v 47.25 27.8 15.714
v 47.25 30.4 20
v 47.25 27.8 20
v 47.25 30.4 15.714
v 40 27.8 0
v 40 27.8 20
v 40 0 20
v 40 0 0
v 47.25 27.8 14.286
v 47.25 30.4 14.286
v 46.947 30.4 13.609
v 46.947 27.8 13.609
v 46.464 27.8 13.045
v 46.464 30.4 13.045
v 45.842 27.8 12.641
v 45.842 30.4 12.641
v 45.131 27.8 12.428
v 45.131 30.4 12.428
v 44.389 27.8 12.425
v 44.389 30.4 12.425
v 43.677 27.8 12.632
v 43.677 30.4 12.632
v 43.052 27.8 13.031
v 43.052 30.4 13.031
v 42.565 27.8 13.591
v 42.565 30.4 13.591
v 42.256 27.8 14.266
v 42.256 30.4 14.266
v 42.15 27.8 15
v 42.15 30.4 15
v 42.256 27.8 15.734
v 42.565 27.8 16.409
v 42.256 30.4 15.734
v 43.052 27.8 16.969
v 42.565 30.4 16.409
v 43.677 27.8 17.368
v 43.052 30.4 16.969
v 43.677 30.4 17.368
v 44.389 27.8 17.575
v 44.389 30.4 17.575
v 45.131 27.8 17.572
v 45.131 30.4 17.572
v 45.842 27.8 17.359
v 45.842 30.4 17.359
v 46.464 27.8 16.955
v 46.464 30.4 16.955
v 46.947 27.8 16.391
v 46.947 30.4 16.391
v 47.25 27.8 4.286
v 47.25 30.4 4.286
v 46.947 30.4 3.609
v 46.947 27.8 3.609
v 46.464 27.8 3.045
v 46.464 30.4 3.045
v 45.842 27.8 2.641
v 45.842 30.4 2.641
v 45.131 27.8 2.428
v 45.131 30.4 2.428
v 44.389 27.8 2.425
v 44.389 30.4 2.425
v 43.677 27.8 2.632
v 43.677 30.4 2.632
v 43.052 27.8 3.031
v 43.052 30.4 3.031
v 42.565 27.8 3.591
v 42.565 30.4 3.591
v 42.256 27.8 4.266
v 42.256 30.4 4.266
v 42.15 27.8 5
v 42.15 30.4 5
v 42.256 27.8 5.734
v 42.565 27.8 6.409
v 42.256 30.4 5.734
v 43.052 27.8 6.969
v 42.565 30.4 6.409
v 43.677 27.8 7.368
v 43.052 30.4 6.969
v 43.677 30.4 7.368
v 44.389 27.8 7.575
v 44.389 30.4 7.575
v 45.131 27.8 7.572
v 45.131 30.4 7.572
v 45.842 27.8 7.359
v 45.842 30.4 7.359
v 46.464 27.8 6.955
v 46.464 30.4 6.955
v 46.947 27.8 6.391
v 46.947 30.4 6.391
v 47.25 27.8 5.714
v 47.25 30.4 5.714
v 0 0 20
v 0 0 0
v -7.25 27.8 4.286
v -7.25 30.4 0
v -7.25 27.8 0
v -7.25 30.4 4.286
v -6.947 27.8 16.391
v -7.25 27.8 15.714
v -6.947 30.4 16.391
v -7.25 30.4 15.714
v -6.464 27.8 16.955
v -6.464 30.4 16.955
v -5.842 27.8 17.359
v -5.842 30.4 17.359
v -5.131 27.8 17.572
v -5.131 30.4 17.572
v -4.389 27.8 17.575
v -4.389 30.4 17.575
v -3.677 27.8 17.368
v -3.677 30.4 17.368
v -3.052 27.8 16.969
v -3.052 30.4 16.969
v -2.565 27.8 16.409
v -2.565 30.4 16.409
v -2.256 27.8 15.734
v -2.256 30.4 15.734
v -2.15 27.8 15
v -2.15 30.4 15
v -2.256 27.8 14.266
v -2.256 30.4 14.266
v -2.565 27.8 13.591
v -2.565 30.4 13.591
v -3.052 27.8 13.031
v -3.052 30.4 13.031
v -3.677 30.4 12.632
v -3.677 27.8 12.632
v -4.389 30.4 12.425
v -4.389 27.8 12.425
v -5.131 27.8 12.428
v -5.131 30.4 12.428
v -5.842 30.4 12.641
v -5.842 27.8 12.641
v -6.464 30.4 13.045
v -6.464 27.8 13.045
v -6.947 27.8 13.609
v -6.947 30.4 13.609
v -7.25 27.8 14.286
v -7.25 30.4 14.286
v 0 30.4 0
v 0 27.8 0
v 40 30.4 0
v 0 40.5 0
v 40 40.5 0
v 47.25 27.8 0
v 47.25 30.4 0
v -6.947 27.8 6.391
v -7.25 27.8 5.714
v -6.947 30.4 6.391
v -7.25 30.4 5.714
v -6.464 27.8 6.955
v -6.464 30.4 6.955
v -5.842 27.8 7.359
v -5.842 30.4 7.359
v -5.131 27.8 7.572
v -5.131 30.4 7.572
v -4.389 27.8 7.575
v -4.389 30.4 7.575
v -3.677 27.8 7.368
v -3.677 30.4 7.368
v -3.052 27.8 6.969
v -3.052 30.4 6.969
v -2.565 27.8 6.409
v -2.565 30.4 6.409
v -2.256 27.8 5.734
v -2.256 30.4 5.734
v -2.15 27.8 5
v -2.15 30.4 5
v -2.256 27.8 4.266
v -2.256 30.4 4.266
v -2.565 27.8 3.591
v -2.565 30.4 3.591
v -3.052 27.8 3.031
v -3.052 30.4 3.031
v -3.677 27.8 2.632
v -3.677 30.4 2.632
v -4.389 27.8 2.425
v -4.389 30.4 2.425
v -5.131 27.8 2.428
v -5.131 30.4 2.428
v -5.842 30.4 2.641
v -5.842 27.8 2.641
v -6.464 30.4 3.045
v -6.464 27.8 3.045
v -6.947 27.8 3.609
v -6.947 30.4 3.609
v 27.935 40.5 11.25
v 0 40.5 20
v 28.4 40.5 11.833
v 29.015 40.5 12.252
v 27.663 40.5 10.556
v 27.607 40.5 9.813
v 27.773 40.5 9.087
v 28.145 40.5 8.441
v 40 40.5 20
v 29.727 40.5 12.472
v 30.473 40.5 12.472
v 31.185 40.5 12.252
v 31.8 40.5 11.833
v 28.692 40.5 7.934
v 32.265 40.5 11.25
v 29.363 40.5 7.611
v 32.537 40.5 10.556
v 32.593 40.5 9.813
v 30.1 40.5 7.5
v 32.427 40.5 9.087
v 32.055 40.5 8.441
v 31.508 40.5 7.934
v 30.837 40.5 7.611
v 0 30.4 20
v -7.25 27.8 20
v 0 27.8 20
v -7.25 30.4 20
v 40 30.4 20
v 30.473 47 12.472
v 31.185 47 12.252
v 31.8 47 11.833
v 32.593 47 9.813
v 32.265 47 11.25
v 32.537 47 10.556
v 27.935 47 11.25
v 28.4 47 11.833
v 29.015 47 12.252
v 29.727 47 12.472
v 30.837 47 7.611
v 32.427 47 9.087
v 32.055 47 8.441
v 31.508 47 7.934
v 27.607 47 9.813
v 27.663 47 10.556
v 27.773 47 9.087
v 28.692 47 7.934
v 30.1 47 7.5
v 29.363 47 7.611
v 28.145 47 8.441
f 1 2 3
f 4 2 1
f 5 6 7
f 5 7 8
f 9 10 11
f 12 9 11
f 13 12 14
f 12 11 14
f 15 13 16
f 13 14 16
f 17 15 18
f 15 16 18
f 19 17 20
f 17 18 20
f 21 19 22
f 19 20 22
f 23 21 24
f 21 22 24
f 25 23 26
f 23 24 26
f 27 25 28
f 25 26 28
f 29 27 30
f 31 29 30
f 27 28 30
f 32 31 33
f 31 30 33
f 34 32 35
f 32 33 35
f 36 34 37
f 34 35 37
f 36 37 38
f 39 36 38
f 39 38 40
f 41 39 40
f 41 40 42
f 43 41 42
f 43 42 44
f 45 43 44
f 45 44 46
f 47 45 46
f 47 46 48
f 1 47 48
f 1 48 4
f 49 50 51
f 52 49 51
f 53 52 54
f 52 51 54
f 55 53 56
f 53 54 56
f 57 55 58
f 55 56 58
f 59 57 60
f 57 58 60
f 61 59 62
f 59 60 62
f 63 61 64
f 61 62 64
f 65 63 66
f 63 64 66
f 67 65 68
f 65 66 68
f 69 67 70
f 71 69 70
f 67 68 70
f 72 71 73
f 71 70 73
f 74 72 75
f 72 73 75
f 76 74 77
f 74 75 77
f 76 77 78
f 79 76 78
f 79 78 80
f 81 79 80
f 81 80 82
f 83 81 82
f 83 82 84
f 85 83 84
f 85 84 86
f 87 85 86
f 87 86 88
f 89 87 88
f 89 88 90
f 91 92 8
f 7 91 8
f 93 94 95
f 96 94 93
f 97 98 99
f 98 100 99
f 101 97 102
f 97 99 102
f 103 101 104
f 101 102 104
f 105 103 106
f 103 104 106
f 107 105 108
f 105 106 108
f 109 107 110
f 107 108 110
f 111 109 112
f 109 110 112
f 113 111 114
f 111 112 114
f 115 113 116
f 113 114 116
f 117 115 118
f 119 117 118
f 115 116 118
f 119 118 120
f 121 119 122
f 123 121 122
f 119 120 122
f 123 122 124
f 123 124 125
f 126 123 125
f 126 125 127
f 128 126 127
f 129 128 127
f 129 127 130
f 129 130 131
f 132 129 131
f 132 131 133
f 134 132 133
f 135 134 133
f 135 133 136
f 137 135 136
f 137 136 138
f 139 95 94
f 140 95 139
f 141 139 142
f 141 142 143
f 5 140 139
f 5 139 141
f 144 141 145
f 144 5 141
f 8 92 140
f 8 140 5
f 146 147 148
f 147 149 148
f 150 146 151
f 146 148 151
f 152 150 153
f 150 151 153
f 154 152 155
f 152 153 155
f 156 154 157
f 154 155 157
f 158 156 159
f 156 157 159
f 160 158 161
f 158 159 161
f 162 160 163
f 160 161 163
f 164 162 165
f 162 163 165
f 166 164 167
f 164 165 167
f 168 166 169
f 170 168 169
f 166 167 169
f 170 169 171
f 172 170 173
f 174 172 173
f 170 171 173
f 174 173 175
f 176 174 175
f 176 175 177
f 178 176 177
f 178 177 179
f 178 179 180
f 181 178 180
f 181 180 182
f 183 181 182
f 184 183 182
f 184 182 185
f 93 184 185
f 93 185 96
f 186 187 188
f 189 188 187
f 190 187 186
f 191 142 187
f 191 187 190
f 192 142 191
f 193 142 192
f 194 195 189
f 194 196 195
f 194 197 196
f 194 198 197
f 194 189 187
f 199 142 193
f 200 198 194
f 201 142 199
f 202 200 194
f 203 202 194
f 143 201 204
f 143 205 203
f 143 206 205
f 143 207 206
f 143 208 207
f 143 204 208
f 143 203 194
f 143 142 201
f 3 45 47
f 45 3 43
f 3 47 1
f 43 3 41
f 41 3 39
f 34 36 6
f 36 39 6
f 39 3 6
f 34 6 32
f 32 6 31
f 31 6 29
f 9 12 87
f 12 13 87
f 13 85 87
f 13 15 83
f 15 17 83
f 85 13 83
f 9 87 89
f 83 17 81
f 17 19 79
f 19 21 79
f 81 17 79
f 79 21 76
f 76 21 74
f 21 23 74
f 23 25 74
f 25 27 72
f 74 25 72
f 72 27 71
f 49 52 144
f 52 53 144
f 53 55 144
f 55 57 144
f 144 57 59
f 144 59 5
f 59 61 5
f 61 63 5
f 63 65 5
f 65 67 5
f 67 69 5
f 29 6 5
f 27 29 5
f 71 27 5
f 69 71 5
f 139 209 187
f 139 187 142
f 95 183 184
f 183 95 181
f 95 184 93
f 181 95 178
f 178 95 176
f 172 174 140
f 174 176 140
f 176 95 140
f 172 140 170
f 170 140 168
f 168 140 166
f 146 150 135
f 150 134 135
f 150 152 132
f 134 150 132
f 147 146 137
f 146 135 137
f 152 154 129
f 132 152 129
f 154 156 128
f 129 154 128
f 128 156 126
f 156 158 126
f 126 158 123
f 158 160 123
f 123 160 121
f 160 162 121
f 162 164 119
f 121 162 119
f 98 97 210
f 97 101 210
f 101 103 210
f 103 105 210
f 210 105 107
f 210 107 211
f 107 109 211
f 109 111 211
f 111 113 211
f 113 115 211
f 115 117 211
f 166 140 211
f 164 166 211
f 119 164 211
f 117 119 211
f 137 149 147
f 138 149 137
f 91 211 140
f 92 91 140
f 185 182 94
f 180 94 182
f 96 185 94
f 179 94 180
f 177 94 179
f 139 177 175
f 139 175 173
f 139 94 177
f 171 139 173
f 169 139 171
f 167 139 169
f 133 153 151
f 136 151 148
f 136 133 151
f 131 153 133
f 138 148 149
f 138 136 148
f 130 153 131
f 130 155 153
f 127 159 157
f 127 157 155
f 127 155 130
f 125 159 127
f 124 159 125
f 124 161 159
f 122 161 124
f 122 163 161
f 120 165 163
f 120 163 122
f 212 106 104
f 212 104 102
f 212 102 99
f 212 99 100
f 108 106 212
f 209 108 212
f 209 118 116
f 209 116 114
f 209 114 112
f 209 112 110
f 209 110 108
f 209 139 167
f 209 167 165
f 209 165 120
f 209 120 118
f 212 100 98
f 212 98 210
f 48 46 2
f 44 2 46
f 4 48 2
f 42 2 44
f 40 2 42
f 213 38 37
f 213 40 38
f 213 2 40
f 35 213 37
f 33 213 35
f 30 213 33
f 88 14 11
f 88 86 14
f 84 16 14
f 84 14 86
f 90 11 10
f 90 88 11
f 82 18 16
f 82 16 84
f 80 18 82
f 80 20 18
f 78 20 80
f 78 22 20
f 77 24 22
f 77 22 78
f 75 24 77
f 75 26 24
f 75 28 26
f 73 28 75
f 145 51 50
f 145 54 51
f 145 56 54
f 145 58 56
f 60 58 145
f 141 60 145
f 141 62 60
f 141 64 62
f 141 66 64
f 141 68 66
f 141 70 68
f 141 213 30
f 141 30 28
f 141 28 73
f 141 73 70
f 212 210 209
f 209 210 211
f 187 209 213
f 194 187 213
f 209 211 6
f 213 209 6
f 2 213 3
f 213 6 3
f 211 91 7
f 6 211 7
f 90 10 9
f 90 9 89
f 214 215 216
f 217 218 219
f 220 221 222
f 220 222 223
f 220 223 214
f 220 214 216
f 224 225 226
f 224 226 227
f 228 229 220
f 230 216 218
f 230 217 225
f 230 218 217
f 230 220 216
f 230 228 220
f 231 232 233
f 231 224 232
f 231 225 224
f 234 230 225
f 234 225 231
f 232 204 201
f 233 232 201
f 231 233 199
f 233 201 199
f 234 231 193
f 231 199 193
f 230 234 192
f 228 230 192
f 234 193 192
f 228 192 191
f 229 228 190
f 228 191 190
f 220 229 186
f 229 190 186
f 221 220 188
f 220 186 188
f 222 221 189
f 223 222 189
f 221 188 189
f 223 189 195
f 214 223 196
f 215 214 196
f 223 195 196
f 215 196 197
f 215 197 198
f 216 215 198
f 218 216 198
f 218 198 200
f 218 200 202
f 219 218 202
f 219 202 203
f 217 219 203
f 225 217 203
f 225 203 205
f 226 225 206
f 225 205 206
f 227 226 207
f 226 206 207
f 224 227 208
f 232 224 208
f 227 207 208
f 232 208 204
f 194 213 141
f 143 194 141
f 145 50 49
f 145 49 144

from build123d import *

# Parameters (mm, degrees)
SKETCH1_W           = 40
SKETCH1_H           = 20
BOSS_EXTRUDE1_DEPTH = 40.5
SKETCH2_R           = 2.5
BOSS_EXTRUDE2_DEPTH = 6.5
SKETCH3_W           = 20
SKETCH3_H           = 2.6
BOSS_EXTRUDE3_DEPTH = 7.25
SKETCH4_W           = 20
SKETCH4_H           = 2.6
BOSS_EXTRUDE4_DEPTH = 7.25
SKETCH5_R           = 2.6
CUT_EXTRUDE5_DEPTH  = 7.25


with BuildPart() as part:
    # Sketch1 → Boss-Extrude1 (new body)
    with BuildSketch(Plane(origin=(0, 0, 0), x_dir=(1, 0, 0), z_dir=(0, 1, 0))):
        with Locations((20, -10)):
            Rectangle(SKETCH1_W, SKETCH1_H)
    extrude(amount=BOSS_EXTRUDE1_DEPTH)

    # Sketch2 → Boss-Extrude2 (add)
    with BuildSketch(Plane(origin=(0, 40.5, 0), x_dir=(1, 0, 0), z_dir=(0, 1, 0))):
        with Locations(Location((30.1, -10, 0), (0, 0, 90))):
            Circle(SKETCH2_R)
    extrude(amount=BOSS_EXTRUDE2_DEPTH)

    # Sketch3 → Boss-Extrude3 (add)
    with BuildSketch(Plane.ZY):
        with Locations((10, 29.1)):
            Rectangle(SKETCH3_W, SKETCH3_H)
    extrude(amount=BOSS_EXTRUDE3_DEPTH)

    # Sketch4 → Boss-Extrude4 (add)
    with BuildSketch(Plane(origin=(40, 0, 0), x_dir=(0, 0, -1), z_dir=(1, 0, 0))):
        with Locations((-10, 29.1)):
            Rectangle(SKETCH4_W, SKETCH4_H)
    extrude(amount=BOSS_EXTRUDE4_DEPTH)

    # Sketch5 → Cut-Extrude5 (cut)
    with BuildSketch(Plane(origin=(0, 30.4, 0), x_dir=(1, 0, 0), z_dir=(0, 1, 0))):
        with Locations((44.75, -5)):
            Circle(SKETCH5_R)
        with Locations((44.75, -15)):
            Circle(SKETCH5_R)
        with Locations((-4.75, -15)):
            Circle(SKETCH5_R)
        with Locations((-4.75, -5)):
            Circle(SKETCH5_R)
    extrude(amount=-CUT_EXTRUDE5_DEPTH, mode=Mode.SUBTRACT)


solid = part.part
